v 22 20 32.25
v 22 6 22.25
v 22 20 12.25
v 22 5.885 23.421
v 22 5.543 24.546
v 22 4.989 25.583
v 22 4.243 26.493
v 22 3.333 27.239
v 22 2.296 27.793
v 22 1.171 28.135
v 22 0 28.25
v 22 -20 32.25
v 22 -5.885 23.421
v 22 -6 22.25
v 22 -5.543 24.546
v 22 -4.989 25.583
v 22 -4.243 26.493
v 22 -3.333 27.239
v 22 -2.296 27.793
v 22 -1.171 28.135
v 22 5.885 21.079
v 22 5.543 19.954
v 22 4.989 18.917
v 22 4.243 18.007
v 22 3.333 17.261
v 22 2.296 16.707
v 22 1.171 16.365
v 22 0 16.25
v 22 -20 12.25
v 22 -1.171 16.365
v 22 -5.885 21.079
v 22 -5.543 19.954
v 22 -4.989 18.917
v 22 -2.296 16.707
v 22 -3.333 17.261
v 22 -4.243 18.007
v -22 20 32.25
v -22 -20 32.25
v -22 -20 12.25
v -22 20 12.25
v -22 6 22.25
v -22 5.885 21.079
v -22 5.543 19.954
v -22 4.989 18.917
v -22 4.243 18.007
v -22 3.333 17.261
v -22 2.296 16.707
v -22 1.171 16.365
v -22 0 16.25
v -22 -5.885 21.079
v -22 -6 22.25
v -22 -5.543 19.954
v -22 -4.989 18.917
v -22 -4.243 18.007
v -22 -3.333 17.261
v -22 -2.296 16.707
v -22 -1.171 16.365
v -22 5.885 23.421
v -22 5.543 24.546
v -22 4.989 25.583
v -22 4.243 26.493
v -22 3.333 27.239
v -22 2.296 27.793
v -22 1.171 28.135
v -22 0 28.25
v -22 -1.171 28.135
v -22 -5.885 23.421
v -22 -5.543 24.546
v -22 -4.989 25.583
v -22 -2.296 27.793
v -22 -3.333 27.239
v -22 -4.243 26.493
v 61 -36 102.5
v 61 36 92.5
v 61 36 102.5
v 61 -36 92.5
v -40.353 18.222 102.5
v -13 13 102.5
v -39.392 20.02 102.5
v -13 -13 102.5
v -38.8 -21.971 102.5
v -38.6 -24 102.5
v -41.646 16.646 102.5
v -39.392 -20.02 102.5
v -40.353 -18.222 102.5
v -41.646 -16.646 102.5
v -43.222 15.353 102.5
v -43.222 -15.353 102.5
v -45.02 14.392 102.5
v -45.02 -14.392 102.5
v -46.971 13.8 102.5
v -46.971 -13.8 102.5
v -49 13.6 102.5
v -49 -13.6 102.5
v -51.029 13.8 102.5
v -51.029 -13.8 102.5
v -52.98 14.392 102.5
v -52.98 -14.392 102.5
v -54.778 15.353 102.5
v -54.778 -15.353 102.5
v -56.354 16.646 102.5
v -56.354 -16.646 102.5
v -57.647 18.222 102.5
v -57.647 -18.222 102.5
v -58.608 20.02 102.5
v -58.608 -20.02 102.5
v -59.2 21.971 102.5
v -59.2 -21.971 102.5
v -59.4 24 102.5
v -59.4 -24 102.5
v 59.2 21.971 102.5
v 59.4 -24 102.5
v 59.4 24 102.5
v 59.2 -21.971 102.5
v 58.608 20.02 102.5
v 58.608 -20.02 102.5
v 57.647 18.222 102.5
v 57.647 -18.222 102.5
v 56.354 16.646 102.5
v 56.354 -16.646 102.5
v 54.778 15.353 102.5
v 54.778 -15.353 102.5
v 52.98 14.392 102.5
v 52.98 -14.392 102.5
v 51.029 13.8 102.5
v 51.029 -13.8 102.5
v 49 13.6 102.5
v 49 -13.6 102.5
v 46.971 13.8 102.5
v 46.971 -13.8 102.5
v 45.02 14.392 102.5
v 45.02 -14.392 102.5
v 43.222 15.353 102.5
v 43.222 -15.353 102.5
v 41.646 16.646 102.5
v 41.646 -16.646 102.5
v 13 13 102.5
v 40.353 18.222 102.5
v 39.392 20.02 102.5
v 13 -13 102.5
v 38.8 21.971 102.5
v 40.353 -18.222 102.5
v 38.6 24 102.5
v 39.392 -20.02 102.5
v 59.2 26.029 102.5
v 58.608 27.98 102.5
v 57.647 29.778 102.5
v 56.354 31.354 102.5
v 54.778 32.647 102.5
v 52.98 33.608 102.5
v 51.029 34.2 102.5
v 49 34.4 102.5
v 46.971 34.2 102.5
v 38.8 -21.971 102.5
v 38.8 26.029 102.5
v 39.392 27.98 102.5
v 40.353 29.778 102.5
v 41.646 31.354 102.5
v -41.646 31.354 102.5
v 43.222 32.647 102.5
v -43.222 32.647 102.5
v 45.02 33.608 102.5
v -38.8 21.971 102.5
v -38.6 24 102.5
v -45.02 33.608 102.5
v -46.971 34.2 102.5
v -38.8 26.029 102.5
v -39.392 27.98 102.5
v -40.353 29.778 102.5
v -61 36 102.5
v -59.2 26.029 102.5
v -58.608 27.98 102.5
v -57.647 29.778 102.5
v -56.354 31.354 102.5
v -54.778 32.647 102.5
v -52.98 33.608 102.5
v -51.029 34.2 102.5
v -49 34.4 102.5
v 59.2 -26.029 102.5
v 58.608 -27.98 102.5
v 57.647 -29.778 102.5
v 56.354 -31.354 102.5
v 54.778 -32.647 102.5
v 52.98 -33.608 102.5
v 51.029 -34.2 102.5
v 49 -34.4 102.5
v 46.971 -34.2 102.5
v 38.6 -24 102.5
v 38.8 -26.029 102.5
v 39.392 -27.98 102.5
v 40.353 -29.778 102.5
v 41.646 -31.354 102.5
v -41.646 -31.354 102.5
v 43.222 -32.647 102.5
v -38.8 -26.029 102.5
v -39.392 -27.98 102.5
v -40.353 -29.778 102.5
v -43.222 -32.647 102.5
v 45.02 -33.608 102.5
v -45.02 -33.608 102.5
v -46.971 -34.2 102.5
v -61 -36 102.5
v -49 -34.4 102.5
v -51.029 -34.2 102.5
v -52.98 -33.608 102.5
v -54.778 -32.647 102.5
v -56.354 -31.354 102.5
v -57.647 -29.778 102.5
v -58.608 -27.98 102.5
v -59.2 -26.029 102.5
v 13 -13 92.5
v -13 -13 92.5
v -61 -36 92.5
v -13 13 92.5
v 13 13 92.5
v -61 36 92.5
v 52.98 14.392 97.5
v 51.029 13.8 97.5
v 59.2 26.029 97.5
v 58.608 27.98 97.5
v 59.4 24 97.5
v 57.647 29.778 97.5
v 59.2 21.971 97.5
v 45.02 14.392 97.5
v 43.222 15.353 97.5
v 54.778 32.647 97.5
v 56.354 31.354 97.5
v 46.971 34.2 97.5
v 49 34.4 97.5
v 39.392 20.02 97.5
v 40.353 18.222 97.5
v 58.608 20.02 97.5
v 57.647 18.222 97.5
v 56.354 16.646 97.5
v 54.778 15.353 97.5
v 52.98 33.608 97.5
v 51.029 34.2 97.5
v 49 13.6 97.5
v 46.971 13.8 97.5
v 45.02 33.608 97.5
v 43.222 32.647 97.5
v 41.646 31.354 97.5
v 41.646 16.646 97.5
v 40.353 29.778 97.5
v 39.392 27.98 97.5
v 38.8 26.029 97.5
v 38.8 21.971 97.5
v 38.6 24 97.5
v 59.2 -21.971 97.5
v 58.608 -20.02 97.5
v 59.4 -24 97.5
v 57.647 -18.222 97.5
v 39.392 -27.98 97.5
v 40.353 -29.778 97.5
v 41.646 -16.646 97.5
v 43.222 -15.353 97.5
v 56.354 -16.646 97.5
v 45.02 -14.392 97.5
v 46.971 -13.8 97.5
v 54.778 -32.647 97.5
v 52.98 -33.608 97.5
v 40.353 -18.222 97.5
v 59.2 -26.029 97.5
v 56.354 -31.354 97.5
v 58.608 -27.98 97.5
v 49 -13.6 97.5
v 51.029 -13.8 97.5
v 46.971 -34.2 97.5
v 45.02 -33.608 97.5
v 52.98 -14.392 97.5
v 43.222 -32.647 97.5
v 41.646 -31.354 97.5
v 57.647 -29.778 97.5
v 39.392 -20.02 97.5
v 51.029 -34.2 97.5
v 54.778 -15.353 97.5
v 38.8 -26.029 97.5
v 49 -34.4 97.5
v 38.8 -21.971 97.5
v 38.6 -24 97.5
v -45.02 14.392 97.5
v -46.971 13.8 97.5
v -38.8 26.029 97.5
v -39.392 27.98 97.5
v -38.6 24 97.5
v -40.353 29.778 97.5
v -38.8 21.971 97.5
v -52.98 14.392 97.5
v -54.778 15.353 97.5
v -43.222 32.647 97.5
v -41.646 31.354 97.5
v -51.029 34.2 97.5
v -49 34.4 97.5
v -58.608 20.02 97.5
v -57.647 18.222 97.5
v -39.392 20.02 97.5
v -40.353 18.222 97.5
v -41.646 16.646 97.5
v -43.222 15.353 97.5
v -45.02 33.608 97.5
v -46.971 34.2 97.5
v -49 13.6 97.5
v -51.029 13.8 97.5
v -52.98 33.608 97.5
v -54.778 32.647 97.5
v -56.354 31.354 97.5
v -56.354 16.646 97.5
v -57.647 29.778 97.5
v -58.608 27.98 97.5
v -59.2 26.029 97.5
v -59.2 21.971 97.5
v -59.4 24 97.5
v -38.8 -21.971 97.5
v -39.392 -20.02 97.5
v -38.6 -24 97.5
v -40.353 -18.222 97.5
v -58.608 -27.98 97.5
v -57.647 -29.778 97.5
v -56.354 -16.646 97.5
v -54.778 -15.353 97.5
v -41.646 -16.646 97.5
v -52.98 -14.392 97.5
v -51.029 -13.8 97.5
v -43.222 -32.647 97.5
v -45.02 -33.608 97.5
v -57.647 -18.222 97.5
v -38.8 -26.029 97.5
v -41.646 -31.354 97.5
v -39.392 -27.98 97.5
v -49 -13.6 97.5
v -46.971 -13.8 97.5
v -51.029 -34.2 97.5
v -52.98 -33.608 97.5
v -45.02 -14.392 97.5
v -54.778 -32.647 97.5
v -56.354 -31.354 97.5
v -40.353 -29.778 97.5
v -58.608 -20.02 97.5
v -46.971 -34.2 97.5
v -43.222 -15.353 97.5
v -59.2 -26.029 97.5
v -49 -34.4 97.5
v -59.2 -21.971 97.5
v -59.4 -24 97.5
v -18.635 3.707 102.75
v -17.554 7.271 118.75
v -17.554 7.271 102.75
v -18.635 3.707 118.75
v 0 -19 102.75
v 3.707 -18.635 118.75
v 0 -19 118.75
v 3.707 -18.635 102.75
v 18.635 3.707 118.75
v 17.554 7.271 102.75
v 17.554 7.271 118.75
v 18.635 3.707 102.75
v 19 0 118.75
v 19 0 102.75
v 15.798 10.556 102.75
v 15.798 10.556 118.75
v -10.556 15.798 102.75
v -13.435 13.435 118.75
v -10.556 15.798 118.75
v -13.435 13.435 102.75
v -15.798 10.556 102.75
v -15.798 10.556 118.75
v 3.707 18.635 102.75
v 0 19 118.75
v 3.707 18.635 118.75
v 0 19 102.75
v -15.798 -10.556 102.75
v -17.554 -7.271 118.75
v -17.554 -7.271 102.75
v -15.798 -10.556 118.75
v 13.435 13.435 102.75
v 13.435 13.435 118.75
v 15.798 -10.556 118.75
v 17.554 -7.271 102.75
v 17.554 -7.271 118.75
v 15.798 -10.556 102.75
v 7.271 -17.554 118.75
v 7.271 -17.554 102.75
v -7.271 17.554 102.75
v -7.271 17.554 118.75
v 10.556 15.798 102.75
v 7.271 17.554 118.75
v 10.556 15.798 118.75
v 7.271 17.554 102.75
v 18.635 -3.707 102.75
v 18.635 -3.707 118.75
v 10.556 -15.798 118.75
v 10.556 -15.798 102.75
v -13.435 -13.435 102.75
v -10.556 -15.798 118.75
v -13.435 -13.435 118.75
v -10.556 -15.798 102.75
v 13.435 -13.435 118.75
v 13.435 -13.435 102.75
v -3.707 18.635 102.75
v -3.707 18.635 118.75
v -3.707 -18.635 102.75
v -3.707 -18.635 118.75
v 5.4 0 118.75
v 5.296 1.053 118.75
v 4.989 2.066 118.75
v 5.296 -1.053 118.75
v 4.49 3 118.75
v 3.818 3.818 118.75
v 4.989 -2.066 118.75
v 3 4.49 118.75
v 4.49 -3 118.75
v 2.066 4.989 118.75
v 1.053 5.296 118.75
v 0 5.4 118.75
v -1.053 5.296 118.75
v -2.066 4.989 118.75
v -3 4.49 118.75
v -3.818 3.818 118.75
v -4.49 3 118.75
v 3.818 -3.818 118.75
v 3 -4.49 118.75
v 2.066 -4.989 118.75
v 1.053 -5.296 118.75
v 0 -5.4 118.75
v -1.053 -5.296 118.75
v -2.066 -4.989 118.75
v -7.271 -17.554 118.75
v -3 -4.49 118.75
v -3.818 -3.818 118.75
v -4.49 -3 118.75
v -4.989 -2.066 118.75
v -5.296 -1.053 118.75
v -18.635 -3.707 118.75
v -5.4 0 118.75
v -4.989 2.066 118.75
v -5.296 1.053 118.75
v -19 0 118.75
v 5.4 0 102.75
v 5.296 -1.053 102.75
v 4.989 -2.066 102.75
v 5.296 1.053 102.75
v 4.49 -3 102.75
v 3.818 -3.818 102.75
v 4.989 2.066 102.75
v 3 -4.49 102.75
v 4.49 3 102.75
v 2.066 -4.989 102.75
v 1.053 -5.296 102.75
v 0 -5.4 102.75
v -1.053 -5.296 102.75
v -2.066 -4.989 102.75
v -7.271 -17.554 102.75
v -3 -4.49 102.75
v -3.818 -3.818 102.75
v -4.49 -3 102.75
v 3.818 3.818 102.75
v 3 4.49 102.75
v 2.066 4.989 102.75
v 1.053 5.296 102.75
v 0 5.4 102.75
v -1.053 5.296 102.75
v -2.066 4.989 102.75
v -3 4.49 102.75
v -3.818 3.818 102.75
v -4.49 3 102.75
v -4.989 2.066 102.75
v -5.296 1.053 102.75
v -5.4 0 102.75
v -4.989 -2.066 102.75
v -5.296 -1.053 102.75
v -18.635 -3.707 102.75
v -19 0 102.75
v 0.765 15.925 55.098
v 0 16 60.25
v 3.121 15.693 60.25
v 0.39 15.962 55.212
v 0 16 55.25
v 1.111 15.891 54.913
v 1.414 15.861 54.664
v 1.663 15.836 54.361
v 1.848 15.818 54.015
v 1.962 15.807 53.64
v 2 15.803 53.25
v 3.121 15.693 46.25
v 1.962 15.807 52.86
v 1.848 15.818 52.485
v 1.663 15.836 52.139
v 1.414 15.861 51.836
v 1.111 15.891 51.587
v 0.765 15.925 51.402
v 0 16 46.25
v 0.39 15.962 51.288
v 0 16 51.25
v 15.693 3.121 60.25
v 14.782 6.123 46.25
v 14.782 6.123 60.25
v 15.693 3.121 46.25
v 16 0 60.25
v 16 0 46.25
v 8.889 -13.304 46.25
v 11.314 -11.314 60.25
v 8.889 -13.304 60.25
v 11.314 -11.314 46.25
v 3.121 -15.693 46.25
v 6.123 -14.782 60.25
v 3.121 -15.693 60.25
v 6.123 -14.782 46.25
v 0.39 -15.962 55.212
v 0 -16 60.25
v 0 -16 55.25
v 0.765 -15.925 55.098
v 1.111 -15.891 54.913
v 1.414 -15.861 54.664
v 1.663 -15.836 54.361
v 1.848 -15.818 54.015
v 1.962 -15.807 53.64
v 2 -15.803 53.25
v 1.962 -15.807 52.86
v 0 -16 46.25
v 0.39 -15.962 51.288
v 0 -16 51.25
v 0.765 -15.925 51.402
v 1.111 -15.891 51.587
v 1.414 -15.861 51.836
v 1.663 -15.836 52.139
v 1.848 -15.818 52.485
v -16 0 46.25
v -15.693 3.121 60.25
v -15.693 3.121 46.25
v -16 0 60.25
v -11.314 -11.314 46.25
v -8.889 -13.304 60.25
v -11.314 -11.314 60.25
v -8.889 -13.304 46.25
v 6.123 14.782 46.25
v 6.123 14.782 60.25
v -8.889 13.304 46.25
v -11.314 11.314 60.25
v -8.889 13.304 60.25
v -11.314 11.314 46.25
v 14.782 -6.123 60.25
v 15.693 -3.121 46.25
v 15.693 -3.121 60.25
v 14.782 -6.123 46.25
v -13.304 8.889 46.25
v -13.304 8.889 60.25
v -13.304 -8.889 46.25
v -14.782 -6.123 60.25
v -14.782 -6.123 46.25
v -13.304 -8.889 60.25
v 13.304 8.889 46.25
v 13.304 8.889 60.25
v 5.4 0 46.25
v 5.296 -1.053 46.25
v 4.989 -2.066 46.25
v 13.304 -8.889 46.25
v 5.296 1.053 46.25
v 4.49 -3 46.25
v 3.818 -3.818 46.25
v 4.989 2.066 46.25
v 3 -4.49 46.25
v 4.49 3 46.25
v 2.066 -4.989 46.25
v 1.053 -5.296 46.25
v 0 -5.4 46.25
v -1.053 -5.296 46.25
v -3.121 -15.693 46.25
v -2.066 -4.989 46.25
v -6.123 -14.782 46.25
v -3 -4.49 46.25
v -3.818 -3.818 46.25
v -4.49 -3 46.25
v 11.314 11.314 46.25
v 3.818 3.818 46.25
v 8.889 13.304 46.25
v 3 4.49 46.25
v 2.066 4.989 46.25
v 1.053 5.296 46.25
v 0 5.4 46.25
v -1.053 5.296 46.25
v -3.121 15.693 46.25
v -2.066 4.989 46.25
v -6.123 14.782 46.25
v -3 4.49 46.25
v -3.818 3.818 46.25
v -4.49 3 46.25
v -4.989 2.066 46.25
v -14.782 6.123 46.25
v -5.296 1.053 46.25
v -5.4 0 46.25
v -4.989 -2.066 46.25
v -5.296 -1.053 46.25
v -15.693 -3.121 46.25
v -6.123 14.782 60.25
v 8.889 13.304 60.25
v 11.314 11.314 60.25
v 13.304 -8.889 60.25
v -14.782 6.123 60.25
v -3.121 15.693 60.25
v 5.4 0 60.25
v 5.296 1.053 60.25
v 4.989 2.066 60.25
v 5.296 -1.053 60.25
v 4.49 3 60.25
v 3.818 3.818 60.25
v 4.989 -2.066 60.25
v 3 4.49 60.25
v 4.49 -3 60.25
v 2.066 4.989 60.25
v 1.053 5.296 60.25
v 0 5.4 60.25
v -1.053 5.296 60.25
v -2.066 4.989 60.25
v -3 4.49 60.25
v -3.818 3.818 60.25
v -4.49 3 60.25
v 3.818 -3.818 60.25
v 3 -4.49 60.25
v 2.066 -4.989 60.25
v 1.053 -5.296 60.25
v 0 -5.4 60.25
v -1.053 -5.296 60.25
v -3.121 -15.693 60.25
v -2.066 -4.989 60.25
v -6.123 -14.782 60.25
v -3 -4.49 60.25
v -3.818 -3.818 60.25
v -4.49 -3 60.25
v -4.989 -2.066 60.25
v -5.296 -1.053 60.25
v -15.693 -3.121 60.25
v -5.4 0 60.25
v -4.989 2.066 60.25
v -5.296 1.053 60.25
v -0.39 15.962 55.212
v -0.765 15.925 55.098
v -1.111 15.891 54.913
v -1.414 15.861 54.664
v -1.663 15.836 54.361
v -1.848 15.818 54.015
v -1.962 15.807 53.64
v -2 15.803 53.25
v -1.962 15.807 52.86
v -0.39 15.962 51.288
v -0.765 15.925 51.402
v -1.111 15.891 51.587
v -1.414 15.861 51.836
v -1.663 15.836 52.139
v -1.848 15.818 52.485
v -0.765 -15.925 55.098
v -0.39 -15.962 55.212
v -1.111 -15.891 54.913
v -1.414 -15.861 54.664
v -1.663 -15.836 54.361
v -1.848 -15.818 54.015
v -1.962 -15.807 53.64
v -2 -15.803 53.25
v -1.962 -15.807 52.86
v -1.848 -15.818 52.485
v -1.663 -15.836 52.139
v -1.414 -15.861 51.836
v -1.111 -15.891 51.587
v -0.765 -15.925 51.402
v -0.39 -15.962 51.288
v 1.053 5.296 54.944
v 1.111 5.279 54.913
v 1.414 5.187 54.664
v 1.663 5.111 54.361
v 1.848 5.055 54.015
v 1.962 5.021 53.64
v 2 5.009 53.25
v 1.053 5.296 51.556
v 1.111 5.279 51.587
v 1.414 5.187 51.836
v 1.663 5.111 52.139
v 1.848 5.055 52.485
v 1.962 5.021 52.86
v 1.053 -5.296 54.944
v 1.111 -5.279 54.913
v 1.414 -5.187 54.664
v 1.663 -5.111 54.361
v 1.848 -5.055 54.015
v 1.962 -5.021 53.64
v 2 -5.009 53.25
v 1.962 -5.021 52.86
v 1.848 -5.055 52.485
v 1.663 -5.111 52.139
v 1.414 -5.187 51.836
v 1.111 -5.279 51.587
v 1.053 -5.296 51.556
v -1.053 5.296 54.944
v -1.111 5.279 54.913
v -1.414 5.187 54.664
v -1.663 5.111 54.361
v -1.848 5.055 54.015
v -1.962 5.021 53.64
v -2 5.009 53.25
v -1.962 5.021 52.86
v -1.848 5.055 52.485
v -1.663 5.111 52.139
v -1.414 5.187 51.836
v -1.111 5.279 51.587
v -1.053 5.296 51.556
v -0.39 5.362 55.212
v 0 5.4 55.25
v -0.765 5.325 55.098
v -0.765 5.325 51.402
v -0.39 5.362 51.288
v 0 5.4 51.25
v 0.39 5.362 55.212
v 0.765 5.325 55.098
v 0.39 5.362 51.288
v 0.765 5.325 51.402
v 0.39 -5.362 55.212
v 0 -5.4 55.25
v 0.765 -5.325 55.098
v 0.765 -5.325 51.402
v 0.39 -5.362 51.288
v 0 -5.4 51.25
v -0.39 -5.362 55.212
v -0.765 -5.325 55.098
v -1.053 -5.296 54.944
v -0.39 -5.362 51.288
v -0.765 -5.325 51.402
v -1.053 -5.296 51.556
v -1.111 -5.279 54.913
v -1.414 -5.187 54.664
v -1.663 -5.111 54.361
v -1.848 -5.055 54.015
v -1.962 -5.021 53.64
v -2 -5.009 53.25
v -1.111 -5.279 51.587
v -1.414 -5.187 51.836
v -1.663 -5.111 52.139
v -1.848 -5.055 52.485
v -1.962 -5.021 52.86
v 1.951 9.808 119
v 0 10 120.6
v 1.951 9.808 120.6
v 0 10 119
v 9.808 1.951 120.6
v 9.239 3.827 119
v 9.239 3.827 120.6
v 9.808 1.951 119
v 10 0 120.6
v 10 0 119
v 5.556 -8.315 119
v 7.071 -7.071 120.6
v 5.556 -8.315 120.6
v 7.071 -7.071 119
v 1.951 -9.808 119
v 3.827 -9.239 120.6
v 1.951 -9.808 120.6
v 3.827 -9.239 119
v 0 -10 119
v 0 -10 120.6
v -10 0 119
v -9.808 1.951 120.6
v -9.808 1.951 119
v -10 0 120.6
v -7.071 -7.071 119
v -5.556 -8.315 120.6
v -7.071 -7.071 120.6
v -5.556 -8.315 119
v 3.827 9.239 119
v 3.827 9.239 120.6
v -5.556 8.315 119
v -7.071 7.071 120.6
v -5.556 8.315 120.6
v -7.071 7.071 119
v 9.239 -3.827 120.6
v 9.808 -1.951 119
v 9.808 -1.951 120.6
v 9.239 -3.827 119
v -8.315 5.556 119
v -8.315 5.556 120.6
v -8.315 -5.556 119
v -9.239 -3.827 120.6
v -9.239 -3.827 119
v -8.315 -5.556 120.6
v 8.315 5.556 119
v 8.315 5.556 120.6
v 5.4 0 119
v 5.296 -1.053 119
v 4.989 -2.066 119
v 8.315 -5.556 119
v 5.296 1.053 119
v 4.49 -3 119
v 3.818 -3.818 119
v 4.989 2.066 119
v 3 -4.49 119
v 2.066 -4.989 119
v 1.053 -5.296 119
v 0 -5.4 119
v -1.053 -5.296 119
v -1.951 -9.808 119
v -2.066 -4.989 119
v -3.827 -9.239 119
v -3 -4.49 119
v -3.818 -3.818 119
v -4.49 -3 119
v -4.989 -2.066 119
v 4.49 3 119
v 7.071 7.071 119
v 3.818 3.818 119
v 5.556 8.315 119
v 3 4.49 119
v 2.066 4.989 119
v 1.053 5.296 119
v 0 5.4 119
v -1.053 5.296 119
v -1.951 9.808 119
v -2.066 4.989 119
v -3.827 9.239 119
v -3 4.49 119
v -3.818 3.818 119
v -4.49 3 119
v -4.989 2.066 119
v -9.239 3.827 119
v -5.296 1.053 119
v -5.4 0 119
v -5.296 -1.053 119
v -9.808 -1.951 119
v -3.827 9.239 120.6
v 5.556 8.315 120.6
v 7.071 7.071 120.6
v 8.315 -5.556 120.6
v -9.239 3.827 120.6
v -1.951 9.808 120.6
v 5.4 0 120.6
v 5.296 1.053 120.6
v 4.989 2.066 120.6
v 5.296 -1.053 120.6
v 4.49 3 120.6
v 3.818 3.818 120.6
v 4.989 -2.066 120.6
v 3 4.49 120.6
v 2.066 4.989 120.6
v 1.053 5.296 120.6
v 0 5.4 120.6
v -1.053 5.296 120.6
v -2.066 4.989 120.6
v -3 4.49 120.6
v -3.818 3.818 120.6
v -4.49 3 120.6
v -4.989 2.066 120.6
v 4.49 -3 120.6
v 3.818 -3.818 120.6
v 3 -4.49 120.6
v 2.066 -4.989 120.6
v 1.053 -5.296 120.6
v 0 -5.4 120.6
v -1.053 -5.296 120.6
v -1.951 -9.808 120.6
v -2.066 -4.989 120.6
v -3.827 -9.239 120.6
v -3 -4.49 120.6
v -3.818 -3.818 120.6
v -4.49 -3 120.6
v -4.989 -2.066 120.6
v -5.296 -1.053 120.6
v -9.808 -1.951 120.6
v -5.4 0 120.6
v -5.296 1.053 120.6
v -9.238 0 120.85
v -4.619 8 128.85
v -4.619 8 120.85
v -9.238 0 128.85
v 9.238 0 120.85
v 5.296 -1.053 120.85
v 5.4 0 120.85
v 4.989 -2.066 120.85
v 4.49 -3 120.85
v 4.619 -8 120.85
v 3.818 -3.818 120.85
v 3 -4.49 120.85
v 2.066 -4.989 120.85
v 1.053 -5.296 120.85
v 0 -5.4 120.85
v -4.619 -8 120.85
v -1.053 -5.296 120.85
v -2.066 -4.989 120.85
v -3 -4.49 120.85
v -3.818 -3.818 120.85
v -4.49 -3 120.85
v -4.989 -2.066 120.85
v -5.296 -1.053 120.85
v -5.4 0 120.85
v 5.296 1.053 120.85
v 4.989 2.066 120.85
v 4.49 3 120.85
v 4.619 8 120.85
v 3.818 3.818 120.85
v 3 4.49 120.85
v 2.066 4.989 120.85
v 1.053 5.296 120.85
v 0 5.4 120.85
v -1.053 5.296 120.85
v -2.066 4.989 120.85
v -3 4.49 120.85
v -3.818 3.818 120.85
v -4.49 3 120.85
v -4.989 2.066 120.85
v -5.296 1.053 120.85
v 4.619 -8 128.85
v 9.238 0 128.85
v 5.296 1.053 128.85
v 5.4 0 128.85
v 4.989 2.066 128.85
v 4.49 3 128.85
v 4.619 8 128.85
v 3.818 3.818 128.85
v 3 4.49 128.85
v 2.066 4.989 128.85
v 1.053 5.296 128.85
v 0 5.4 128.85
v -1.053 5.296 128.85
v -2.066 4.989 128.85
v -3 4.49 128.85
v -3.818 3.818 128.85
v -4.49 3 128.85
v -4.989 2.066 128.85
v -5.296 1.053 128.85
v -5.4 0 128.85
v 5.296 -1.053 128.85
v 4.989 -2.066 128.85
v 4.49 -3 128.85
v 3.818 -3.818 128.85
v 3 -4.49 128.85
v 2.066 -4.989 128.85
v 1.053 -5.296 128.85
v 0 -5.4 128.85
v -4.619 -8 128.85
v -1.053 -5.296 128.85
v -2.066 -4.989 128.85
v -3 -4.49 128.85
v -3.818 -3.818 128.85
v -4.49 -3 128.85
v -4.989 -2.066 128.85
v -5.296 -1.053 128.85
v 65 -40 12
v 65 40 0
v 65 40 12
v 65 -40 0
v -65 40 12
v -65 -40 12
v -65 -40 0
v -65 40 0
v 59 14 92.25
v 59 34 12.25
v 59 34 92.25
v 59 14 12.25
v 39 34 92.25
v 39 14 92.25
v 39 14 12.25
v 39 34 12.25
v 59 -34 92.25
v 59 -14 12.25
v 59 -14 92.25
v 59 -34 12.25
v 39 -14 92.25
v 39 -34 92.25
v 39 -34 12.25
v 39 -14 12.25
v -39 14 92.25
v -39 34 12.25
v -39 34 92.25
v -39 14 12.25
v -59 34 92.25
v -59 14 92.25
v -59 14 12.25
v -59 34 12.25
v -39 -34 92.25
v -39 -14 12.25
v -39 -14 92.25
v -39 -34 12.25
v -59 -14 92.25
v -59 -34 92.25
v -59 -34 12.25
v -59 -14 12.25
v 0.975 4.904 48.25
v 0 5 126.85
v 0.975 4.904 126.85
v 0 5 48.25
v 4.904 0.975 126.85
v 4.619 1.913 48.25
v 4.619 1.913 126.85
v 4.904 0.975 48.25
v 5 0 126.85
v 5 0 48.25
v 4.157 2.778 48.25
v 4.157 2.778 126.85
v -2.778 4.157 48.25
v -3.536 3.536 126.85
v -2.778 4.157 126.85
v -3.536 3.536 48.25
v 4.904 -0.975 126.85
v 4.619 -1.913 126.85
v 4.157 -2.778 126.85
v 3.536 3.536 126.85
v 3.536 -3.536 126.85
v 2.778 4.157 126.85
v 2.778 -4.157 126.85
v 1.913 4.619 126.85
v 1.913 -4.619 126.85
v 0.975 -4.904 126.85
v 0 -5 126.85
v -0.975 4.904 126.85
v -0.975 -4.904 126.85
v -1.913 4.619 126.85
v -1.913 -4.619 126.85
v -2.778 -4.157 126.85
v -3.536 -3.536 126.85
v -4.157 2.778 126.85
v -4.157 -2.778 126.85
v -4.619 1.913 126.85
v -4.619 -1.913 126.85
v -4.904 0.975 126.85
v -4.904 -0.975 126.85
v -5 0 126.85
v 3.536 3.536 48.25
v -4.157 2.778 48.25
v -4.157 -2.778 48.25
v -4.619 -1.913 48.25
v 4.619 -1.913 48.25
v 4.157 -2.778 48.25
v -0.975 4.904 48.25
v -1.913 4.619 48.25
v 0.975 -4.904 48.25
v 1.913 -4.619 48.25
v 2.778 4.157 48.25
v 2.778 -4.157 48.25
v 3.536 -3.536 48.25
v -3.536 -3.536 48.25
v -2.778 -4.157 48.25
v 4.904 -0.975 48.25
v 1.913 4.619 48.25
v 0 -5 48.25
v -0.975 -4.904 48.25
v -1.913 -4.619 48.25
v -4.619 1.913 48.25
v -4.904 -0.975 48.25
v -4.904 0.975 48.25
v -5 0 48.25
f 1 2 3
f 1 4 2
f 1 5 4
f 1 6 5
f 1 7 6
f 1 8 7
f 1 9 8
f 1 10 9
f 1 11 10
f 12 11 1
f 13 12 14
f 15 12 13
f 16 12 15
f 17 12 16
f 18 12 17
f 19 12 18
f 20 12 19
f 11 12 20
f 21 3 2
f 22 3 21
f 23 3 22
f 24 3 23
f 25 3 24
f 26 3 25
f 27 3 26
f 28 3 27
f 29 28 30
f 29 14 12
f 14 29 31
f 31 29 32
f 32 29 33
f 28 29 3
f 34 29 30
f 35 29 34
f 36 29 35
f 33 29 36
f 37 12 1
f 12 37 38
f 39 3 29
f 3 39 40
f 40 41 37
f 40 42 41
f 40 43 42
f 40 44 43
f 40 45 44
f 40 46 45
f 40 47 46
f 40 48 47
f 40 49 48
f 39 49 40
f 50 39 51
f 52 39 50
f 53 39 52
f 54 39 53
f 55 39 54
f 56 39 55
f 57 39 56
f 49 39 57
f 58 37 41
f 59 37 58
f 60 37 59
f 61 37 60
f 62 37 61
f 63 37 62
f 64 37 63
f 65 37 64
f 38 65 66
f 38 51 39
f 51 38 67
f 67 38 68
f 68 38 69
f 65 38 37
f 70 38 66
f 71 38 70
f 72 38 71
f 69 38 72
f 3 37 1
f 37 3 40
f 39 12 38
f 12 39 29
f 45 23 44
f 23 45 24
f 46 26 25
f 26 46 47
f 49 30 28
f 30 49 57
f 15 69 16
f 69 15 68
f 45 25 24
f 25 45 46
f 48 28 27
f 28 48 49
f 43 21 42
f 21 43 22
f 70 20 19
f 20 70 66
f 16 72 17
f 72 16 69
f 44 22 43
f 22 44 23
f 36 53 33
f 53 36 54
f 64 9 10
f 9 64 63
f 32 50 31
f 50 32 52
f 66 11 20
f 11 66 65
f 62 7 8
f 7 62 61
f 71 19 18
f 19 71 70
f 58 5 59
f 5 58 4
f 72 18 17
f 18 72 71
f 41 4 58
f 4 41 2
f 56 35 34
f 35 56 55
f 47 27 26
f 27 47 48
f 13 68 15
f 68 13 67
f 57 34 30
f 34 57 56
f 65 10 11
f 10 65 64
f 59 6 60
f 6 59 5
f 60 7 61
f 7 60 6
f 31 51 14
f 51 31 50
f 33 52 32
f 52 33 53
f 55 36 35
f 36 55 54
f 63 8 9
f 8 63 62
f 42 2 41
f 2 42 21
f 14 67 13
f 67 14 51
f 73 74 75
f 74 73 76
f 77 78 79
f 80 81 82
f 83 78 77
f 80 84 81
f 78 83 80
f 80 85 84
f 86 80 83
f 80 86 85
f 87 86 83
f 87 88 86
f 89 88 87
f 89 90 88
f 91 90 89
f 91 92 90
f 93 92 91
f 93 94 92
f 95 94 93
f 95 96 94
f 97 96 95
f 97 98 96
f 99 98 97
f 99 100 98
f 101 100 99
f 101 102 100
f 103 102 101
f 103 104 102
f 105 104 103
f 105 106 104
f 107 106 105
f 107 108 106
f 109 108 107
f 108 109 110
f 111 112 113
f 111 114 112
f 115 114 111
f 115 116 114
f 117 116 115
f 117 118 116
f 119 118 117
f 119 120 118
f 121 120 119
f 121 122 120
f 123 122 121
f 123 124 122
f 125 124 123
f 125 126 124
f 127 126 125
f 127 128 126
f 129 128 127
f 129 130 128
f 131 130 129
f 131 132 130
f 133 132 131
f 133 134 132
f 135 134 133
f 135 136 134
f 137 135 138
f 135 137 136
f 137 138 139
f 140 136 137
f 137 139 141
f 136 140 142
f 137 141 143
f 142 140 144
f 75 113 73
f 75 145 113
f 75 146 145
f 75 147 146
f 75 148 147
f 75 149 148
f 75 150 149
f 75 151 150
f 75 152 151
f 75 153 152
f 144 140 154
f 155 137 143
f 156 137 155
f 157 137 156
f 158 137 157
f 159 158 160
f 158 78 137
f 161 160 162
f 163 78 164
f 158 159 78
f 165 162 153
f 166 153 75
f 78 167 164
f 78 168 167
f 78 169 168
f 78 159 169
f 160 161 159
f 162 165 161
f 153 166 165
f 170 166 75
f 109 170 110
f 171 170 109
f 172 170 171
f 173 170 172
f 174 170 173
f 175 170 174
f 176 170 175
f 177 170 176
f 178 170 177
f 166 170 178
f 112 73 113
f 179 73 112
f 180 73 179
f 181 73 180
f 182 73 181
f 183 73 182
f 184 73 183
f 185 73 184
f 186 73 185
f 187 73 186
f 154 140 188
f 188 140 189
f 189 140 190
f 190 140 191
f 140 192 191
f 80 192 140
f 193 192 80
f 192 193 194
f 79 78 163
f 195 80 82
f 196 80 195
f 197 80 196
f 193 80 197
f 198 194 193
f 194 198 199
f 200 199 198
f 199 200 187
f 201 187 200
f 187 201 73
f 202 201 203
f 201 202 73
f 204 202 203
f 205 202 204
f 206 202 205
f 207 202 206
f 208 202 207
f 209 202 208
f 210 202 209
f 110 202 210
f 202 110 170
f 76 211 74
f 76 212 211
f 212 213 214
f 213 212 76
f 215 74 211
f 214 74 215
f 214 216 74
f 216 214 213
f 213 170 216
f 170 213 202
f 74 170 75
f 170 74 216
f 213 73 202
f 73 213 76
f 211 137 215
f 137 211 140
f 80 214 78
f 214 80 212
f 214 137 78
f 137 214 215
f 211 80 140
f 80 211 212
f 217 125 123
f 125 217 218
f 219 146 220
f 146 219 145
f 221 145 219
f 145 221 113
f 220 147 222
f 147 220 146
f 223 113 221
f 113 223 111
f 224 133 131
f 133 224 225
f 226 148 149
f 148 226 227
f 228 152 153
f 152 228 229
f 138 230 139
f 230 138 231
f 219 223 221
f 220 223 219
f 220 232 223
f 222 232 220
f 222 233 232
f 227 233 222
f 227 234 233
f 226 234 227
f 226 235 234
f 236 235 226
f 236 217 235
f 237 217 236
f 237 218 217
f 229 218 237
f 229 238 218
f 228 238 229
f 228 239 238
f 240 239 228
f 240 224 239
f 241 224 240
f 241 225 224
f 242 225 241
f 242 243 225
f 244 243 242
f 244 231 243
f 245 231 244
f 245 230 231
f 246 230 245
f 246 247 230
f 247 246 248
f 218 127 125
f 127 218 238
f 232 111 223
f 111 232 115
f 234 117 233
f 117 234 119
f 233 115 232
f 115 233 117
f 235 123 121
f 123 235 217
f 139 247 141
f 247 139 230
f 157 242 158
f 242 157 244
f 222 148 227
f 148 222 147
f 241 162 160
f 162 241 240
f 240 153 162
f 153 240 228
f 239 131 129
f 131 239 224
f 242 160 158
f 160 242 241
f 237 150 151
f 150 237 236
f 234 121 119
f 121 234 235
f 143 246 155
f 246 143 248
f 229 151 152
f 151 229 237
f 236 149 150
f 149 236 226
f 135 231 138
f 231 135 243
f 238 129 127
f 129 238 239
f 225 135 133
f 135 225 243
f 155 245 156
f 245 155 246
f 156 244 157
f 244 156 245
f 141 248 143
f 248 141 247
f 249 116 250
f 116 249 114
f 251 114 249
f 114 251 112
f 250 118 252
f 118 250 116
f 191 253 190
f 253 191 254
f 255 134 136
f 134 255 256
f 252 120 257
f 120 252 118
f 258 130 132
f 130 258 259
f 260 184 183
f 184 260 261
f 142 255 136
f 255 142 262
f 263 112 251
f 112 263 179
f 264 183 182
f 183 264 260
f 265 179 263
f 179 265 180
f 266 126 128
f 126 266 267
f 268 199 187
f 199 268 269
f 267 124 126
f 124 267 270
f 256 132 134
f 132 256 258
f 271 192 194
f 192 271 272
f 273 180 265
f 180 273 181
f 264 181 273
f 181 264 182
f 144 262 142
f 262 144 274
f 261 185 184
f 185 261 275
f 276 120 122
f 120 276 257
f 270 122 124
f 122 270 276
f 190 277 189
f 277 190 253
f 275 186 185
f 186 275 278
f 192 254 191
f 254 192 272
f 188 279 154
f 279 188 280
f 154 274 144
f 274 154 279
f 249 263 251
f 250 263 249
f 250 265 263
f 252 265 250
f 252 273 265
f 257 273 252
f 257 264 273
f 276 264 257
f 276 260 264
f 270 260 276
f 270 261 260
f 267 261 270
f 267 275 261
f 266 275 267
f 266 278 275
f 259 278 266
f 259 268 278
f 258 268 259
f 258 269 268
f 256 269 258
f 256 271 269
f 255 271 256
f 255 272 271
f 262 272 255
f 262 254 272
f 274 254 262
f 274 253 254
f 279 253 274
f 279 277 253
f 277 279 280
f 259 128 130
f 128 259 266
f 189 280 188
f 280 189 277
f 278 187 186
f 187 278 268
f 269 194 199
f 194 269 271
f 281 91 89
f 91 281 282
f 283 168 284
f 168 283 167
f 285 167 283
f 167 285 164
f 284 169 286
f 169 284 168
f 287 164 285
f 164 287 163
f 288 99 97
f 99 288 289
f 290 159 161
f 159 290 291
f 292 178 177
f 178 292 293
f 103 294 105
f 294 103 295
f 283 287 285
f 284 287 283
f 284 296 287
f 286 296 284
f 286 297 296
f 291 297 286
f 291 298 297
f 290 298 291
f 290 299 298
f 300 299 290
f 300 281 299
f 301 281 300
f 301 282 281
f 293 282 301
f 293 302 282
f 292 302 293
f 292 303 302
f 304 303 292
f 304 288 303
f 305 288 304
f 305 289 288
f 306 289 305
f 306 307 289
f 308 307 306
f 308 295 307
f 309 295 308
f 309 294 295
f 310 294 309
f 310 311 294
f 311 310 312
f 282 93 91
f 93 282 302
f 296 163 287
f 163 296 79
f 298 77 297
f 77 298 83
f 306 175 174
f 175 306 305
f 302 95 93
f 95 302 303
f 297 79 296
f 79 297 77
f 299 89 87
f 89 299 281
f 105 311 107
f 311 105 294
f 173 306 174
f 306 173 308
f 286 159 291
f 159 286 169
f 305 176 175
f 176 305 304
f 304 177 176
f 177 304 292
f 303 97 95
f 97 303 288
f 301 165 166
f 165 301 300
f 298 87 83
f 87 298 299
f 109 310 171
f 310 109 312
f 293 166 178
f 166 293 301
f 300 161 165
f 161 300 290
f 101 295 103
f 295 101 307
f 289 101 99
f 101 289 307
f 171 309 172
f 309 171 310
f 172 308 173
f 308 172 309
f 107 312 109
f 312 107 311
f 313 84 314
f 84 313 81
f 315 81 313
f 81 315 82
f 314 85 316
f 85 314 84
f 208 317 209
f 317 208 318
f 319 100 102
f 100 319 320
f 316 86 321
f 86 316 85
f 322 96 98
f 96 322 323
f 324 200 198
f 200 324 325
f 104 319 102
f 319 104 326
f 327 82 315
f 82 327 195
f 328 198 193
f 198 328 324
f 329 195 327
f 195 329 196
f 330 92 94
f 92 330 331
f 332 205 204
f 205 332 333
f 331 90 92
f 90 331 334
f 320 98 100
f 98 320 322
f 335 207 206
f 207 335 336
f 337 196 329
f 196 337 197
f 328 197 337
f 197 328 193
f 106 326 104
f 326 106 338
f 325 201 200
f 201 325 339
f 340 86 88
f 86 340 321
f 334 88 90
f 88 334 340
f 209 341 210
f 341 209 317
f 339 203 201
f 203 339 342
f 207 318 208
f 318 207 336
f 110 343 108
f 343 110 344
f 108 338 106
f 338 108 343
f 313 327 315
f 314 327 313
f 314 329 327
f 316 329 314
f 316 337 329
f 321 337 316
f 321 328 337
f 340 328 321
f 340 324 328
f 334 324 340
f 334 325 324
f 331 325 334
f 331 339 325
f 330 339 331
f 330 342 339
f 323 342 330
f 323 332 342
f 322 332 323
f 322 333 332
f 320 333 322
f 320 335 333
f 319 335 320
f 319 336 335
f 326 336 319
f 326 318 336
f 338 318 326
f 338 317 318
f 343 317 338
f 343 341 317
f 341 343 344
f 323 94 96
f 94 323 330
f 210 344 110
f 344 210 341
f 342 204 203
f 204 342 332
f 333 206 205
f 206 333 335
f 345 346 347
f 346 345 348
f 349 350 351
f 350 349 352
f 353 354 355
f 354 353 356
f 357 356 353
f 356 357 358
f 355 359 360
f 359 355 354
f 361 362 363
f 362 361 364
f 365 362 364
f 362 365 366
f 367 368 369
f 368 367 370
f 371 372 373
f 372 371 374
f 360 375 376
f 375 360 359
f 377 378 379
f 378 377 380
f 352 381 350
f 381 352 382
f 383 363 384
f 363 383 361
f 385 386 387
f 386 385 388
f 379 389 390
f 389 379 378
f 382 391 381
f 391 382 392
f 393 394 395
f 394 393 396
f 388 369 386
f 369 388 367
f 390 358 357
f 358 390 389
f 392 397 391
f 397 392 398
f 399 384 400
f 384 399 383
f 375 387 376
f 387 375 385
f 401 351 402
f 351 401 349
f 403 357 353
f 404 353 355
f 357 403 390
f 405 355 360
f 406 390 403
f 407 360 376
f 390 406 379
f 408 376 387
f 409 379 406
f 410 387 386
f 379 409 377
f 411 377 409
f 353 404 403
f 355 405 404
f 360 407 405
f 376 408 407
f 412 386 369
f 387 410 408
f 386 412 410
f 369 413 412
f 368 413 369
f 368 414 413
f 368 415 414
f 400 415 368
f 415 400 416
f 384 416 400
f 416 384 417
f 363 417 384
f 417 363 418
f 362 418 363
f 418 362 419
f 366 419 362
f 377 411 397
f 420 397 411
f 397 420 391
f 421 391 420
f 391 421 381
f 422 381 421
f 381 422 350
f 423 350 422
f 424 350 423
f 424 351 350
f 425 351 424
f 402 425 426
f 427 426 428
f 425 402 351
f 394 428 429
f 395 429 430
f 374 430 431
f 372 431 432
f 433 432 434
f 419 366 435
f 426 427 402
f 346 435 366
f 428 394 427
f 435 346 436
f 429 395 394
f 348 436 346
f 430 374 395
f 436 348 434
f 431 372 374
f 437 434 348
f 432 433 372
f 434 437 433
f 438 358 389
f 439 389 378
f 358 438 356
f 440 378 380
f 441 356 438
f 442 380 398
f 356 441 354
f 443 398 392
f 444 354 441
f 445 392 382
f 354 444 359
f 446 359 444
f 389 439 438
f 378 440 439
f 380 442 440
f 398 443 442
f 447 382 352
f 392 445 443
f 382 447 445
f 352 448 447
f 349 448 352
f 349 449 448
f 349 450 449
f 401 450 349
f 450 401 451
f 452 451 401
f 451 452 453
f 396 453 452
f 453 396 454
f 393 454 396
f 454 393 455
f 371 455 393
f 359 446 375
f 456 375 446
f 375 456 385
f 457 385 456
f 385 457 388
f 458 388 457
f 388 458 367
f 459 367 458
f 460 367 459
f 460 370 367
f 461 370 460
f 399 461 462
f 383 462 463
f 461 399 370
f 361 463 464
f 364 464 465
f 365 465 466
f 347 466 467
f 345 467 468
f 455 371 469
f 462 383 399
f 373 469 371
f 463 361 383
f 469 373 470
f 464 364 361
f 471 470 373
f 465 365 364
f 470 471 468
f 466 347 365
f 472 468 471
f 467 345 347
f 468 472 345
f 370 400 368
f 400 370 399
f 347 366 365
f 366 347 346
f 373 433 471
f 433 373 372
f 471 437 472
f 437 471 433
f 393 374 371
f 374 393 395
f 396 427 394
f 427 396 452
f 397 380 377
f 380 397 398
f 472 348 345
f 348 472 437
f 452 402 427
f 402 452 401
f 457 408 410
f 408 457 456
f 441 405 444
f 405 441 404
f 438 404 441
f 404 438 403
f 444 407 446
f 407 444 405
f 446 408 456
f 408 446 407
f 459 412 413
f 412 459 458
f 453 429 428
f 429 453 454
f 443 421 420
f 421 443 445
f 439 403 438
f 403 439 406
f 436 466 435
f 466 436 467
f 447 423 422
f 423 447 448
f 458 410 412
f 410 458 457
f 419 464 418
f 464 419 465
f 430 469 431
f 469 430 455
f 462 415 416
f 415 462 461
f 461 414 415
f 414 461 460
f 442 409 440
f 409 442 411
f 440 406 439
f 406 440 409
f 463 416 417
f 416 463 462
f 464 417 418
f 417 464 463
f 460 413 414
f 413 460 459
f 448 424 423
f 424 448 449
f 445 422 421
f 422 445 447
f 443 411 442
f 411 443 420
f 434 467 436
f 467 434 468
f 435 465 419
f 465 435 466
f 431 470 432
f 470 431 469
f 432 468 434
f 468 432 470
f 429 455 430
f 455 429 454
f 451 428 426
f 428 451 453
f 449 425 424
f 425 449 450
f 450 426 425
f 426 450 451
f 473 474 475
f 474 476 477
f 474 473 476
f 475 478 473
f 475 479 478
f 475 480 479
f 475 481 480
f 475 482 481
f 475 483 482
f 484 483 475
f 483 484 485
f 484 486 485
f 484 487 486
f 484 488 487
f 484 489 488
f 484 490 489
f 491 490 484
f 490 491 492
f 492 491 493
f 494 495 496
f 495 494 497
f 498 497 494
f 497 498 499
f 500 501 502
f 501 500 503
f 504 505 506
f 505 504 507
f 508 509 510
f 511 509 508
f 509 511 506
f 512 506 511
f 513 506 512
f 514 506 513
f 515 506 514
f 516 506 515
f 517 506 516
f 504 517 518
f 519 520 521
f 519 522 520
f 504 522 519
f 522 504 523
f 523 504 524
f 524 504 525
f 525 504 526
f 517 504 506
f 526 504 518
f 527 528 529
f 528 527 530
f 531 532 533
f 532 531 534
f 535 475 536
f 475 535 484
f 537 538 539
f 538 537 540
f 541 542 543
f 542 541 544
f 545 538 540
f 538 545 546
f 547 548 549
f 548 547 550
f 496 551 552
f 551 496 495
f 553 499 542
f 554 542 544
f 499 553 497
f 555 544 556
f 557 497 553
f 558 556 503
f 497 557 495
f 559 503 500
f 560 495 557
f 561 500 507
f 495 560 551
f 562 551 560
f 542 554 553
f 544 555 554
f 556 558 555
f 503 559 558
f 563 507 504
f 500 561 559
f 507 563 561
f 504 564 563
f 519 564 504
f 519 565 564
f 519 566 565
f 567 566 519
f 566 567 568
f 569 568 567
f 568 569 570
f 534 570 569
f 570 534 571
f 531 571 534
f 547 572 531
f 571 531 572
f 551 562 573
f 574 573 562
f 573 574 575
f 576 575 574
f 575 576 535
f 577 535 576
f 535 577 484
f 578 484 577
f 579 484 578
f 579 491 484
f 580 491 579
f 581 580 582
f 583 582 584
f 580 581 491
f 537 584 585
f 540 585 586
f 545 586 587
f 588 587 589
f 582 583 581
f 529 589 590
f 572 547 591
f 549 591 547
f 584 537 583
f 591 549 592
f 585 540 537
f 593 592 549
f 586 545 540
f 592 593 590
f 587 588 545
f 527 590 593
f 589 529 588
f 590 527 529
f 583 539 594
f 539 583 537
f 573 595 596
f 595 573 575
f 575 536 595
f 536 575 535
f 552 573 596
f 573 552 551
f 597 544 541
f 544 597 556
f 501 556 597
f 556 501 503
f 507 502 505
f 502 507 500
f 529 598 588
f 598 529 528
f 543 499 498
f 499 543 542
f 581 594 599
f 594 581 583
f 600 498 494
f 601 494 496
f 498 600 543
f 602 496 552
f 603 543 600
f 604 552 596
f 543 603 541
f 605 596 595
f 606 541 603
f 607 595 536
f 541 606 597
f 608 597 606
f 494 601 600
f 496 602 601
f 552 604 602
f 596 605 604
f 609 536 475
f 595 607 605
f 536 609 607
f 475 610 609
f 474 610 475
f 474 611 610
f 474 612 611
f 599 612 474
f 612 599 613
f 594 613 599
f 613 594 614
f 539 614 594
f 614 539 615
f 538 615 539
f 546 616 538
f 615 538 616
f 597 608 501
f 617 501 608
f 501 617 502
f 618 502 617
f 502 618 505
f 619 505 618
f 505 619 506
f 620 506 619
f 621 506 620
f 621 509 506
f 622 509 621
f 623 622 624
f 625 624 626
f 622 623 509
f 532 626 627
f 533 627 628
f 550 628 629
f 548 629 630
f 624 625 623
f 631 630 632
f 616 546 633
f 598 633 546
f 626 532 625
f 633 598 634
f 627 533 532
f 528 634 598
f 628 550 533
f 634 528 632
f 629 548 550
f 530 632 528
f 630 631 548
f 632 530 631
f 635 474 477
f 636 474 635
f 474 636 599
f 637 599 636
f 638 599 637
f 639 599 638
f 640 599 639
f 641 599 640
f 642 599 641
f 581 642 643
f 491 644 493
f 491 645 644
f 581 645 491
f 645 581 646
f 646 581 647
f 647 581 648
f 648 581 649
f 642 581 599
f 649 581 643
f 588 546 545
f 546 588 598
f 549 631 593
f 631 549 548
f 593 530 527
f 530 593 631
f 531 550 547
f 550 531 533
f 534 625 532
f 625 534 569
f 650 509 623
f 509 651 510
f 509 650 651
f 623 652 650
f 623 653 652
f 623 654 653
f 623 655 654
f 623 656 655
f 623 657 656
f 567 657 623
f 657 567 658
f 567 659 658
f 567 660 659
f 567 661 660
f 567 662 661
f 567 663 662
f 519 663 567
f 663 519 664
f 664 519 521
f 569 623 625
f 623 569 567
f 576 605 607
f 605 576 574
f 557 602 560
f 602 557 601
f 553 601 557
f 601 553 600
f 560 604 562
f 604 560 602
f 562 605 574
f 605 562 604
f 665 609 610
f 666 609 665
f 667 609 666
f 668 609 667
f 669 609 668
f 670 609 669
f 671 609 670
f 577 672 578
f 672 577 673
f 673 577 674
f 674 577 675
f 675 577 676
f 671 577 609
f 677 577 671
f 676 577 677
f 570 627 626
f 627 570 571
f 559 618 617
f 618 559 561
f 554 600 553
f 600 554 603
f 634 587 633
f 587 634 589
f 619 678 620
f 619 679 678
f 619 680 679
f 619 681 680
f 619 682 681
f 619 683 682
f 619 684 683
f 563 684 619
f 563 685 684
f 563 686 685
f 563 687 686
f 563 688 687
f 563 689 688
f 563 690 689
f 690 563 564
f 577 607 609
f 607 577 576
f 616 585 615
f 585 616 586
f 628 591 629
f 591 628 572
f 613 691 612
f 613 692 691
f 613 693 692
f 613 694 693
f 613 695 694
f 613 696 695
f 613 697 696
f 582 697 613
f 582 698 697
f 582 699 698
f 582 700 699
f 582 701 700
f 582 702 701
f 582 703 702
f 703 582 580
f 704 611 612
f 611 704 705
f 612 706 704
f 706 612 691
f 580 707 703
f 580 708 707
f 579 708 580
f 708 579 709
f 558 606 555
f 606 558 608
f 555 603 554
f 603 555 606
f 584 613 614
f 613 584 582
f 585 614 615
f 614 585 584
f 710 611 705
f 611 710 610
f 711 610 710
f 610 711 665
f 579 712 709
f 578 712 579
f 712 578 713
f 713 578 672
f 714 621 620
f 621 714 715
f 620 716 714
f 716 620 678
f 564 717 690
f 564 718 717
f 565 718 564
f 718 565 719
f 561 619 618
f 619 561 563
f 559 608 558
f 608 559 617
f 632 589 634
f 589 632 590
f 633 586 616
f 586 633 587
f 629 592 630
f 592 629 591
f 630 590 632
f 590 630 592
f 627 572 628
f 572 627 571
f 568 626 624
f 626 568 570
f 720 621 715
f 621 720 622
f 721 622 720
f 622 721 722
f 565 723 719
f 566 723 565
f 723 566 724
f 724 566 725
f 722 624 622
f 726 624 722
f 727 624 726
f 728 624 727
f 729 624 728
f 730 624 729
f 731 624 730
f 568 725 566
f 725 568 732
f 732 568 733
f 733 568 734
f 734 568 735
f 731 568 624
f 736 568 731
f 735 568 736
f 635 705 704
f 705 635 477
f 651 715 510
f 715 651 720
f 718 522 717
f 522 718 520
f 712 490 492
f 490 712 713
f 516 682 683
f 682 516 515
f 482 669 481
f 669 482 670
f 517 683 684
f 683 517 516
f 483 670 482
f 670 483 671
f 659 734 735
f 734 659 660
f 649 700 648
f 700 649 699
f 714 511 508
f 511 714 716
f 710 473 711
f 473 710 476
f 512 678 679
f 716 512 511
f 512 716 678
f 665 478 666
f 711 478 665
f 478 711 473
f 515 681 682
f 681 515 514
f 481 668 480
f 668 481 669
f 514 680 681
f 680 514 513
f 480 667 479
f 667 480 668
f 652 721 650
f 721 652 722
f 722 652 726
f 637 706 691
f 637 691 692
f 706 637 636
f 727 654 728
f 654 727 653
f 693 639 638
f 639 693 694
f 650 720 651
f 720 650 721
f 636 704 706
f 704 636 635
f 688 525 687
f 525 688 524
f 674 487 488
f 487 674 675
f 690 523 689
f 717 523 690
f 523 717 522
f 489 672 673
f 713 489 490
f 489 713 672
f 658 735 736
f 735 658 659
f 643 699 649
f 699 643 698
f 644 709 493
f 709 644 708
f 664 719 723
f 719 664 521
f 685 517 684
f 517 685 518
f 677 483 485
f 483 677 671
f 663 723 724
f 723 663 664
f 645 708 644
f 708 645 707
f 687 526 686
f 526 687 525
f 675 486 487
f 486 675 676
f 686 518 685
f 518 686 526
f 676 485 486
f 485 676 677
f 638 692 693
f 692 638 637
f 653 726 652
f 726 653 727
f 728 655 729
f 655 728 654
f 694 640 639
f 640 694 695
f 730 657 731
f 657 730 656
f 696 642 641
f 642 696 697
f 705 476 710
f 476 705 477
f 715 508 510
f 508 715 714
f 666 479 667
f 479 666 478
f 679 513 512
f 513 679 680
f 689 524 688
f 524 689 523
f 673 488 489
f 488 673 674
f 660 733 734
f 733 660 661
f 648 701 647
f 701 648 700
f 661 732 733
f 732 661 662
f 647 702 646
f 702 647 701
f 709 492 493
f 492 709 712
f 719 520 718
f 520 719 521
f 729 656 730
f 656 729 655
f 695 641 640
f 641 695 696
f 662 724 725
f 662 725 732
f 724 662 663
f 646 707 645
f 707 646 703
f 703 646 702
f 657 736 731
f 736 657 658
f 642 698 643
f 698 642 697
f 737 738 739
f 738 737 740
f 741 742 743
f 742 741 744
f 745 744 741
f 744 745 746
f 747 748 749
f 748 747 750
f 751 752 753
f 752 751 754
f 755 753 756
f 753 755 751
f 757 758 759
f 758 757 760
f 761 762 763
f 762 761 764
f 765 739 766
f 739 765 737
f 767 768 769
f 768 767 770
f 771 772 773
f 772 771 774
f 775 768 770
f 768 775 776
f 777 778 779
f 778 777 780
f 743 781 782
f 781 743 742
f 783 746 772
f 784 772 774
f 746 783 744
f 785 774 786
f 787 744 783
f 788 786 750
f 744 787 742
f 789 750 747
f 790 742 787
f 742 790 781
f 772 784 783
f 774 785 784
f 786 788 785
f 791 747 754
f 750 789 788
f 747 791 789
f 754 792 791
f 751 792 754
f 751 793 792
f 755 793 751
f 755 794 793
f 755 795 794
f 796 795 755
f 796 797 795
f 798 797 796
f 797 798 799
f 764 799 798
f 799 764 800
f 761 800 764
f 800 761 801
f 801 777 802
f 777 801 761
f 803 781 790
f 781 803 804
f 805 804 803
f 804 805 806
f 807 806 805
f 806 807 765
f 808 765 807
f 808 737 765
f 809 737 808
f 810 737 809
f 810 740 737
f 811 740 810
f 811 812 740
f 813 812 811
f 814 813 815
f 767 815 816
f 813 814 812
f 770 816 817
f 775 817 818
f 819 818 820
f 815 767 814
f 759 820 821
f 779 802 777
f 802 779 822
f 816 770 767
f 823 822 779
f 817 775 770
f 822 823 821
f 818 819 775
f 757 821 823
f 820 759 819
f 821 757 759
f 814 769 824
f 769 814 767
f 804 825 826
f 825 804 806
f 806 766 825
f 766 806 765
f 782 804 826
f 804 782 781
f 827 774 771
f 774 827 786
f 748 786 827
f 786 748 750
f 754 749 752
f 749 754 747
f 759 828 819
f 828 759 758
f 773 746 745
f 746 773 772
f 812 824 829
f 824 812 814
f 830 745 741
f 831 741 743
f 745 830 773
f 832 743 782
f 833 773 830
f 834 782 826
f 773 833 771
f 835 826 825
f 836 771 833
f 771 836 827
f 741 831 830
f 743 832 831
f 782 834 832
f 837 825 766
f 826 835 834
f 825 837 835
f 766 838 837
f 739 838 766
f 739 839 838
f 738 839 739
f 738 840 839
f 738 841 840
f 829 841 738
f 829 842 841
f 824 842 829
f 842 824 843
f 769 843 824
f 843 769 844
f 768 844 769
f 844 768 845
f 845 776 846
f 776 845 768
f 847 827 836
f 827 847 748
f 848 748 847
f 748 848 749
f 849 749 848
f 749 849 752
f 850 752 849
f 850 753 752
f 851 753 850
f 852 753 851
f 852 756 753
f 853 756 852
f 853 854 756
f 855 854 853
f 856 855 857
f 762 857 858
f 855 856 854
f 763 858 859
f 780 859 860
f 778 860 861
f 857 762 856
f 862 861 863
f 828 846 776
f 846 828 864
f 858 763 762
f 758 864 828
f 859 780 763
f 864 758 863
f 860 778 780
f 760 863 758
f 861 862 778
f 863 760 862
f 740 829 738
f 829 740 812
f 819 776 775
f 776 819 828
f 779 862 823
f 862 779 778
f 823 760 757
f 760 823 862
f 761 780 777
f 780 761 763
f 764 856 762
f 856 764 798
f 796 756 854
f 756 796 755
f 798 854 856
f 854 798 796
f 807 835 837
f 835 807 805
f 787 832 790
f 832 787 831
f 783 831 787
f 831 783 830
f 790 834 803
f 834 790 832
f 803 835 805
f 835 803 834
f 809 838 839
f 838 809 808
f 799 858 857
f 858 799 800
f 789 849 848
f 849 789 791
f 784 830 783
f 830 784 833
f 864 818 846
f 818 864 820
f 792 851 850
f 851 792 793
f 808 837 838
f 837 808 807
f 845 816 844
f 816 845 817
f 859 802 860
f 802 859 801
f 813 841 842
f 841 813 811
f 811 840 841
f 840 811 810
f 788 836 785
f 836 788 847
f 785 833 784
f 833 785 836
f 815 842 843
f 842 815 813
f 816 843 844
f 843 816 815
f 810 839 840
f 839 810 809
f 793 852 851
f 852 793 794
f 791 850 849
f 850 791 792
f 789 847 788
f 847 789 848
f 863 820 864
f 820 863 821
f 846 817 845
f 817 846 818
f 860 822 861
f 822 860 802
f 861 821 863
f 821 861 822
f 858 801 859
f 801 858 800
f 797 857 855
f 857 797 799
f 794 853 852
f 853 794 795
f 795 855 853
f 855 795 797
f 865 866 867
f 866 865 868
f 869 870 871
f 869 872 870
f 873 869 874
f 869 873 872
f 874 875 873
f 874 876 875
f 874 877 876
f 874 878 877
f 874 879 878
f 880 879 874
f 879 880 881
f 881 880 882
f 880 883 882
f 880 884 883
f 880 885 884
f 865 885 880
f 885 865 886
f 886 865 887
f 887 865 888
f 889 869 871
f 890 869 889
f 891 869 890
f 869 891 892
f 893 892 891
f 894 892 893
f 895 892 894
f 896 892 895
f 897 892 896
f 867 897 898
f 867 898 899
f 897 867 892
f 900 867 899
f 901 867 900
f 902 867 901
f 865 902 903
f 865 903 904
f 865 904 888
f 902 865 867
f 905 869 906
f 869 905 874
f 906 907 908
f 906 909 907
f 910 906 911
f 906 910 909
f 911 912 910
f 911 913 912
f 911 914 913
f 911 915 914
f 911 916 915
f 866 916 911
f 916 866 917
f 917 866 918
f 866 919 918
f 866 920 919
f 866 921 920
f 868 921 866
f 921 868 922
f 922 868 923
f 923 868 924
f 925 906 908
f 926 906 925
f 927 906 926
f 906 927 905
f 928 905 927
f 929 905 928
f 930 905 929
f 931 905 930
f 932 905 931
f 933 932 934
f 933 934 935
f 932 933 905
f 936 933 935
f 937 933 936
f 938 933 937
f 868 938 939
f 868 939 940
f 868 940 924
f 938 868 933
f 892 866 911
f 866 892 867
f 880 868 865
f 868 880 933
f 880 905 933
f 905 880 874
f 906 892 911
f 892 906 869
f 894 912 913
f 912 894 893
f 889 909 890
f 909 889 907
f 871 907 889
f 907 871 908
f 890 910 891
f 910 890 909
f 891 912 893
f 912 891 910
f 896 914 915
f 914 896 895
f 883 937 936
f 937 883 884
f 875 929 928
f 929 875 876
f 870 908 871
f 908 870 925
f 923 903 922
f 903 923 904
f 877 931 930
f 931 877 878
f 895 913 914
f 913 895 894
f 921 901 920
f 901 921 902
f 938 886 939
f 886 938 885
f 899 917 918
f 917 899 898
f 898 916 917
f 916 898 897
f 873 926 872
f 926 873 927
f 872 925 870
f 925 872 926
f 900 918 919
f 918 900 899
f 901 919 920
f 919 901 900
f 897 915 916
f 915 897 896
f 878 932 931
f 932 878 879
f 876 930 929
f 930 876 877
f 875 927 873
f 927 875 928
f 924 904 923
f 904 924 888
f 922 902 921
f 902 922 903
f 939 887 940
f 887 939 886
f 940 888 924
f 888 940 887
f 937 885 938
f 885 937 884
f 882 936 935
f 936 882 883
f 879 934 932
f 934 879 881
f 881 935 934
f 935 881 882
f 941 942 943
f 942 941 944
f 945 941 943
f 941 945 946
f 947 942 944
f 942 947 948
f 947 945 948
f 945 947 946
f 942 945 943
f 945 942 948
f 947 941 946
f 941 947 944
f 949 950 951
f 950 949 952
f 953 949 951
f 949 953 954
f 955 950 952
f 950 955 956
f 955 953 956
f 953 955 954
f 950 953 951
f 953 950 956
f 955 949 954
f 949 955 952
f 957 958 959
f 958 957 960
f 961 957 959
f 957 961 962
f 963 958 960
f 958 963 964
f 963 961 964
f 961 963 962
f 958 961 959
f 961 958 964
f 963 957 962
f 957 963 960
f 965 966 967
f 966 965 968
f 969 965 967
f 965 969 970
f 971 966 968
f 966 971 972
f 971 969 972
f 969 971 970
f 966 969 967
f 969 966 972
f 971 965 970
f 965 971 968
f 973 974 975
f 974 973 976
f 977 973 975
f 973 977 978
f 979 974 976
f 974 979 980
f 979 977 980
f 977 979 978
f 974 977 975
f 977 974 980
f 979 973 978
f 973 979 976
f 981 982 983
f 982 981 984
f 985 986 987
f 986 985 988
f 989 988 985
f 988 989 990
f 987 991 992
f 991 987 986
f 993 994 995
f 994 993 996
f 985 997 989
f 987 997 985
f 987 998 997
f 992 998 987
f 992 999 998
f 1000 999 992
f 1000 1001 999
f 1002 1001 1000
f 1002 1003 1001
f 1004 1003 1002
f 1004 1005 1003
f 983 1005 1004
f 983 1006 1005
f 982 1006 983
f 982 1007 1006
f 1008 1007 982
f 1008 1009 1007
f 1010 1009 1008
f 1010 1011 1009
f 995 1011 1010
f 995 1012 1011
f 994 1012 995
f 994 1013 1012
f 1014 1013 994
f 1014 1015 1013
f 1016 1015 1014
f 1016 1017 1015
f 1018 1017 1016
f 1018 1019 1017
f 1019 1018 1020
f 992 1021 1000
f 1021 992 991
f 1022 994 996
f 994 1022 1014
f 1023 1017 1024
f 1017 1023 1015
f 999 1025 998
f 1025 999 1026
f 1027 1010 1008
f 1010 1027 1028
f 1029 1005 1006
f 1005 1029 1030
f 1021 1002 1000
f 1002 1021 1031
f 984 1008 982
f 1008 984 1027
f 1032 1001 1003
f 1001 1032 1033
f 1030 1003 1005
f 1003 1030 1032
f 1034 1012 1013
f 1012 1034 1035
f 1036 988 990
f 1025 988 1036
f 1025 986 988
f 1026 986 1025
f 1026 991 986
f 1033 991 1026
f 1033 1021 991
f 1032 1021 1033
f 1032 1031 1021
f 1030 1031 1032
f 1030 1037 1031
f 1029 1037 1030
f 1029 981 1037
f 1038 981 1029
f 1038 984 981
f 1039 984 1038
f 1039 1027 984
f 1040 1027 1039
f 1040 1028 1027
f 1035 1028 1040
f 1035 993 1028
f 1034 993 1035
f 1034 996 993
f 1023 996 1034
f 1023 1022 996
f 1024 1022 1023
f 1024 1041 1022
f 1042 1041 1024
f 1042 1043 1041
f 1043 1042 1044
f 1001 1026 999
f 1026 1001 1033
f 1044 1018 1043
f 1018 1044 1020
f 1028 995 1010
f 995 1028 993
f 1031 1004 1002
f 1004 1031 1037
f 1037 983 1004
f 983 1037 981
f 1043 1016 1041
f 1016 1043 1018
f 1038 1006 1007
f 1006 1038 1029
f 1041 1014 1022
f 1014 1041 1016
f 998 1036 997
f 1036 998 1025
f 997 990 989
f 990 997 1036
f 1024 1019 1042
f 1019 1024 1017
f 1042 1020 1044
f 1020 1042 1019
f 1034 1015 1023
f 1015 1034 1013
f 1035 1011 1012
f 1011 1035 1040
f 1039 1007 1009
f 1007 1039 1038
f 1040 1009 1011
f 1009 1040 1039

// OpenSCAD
$fn = 32;

// ------------------------------------------------------------------------
// Arbor press fixture: screw d10, posts 80 mm, gap 14 mm
// Every part is its own module, assembly() places every instance.
// ------------------------------------------------------------------------

// --- part 1 ---
module press_bed() {
  difference() {
    translate([-65, -40, 0]) cube([130, 80, 12]);
  }
}

// --- part 2 ---
module anvil_block() {
  difference() {
    translate([-22, -20, 0]) cube([44, 40, 20]);
    translate([0, 0, 10]) rotate([0, 90, 0]) cylinder(h = 46, d = 12, center = true);
  }
}

// --- part 3 ---
module press_post_a() {
  translate([-10, -10, 0]) cube([20, 20, 80]);
}

// --- part 4 ---
module press_post_b() {
  translate([-10, -10, 0]) cube([20, 20, 80]);
}

// --- part 5 ---
module press_post_c() {
  translate([-10, -10, 0]) cube([20, 20, 80]);
}

// --- part 6 ---
module press_post_d() {
  translate([-10, -10, 0]) cube([20, 20, 80]);
}

// --- part 7 ---
module press_frame() {
  difference() {
    translate([-61, -36, 0]) cube([122, 72, 10]);
    translate([-13, -13, -1]) cube([26, 26, 12]);
    translate([49, 24, 5]) cylinder(h = 6, d = 20.8);
    translate([49, -24, 5]) cylinder(h = 6, d = 20.8);
    translate([-49, 24, 5]) cylinder(h = 6, d = 20.8);
    translate([-49, -24, 5]) cylinder(h = 6, d = 20.8);
  }
}

// --- part 8 ---
module guide_ring() {
  difference() {
      translate([0, 0, 0]) cylinder(h = 16, d = 38);
      translate([0, 0, -1]) cylinder(h = 18, d = 10.8);
    }
}

// --- part 9 ---
module press_screw() {
  translate([0, 0, -39.3]) cylinder(h = 78.6, d = 10);
}

// --- part 10 ---
module press_head() {
  difference() {
    cylinder(h = 14, d = 32);
    translate([0, 0, -1]) cylinder(h = 16, d = 10.8);
    translate([0, 0, 7]) rotate([90, 0, 0]) cylinder(h = 34, d = 4, center = true);
  }
}

// --- part 11 ---
module nut_washer() {
  difference() {
      translate([0, 0, 0]) cylinder(h = 1.6, d = 20);
      translate([0, 0, -1]) cylinder(h = 3.6, d = 10.8);
    }
}

// --- part 12 ---
module press_nut() {
  difference() {
    linear_extrude(height = 8) polygon(points = [[9.238, 0], [4.619, 8], [-4.619, 8], [-9.238, 0], [-4.619, -8], [4.619, -8]]);
    translate([0, 0, -1]) cylinder(h = 10, d = 10.8);
  }
}

// --- assembly ---
module assembly() {
  color([0.80, 0.24, 0.20]) translate([0, 0, 0]) rotate([0, 0, 0]) press_bed();
  color([0.20, 0.45, 0.75]) translate([0, 0, 12.25]) rotate([0, 0, 0]) anvil_block();
  color([0.25, 0.62, 0.32]) translate([49, 24, 12.25]) rotate([0, 0, 0]) press_post_a();
  color([0.92, 0.70, 0.18]) translate([49, -24, 12.25]) rotate([0, 0, 0]) press_post_b();
  color([0.58, 0.35, 0.70]) translate([-49, 24, 12.25]) rotate([0, 0, 0]) press_post_c();
  color([0.16, 0.66, 0.66]) translate([-49, -24, 12.25]) rotate([0, 0, 0]) press_post_d();
  color([0.85, 0.48, 0.18]) translate([0, 0, 92.5]) rotate([0, 0, 0]) press_frame();
  color([0.55, 0.60, 0.65]) translate([0, 0, 102.75]) rotate([0, 0, 0]) guide_ring();
  color([0.75, 0.30, 0.55]) translate([0, 0, 87.55]) rotate([0, 0, 0]) press_screw();
  color([0.42, 0.52, 0.28]) translate([0, 0, 46.25]) rotate([0, 0, 0]) press_head();
  color([0.80, 0.24, 0.20]) translate([0, 0, 119]) rotate([0, 0, 0]) nut_washer();
  color([0.20, 0.45, 0.75]) translate([0, 0, 120.85]) rotate([0, 0, 0]) press_nut();
}

assembly();
